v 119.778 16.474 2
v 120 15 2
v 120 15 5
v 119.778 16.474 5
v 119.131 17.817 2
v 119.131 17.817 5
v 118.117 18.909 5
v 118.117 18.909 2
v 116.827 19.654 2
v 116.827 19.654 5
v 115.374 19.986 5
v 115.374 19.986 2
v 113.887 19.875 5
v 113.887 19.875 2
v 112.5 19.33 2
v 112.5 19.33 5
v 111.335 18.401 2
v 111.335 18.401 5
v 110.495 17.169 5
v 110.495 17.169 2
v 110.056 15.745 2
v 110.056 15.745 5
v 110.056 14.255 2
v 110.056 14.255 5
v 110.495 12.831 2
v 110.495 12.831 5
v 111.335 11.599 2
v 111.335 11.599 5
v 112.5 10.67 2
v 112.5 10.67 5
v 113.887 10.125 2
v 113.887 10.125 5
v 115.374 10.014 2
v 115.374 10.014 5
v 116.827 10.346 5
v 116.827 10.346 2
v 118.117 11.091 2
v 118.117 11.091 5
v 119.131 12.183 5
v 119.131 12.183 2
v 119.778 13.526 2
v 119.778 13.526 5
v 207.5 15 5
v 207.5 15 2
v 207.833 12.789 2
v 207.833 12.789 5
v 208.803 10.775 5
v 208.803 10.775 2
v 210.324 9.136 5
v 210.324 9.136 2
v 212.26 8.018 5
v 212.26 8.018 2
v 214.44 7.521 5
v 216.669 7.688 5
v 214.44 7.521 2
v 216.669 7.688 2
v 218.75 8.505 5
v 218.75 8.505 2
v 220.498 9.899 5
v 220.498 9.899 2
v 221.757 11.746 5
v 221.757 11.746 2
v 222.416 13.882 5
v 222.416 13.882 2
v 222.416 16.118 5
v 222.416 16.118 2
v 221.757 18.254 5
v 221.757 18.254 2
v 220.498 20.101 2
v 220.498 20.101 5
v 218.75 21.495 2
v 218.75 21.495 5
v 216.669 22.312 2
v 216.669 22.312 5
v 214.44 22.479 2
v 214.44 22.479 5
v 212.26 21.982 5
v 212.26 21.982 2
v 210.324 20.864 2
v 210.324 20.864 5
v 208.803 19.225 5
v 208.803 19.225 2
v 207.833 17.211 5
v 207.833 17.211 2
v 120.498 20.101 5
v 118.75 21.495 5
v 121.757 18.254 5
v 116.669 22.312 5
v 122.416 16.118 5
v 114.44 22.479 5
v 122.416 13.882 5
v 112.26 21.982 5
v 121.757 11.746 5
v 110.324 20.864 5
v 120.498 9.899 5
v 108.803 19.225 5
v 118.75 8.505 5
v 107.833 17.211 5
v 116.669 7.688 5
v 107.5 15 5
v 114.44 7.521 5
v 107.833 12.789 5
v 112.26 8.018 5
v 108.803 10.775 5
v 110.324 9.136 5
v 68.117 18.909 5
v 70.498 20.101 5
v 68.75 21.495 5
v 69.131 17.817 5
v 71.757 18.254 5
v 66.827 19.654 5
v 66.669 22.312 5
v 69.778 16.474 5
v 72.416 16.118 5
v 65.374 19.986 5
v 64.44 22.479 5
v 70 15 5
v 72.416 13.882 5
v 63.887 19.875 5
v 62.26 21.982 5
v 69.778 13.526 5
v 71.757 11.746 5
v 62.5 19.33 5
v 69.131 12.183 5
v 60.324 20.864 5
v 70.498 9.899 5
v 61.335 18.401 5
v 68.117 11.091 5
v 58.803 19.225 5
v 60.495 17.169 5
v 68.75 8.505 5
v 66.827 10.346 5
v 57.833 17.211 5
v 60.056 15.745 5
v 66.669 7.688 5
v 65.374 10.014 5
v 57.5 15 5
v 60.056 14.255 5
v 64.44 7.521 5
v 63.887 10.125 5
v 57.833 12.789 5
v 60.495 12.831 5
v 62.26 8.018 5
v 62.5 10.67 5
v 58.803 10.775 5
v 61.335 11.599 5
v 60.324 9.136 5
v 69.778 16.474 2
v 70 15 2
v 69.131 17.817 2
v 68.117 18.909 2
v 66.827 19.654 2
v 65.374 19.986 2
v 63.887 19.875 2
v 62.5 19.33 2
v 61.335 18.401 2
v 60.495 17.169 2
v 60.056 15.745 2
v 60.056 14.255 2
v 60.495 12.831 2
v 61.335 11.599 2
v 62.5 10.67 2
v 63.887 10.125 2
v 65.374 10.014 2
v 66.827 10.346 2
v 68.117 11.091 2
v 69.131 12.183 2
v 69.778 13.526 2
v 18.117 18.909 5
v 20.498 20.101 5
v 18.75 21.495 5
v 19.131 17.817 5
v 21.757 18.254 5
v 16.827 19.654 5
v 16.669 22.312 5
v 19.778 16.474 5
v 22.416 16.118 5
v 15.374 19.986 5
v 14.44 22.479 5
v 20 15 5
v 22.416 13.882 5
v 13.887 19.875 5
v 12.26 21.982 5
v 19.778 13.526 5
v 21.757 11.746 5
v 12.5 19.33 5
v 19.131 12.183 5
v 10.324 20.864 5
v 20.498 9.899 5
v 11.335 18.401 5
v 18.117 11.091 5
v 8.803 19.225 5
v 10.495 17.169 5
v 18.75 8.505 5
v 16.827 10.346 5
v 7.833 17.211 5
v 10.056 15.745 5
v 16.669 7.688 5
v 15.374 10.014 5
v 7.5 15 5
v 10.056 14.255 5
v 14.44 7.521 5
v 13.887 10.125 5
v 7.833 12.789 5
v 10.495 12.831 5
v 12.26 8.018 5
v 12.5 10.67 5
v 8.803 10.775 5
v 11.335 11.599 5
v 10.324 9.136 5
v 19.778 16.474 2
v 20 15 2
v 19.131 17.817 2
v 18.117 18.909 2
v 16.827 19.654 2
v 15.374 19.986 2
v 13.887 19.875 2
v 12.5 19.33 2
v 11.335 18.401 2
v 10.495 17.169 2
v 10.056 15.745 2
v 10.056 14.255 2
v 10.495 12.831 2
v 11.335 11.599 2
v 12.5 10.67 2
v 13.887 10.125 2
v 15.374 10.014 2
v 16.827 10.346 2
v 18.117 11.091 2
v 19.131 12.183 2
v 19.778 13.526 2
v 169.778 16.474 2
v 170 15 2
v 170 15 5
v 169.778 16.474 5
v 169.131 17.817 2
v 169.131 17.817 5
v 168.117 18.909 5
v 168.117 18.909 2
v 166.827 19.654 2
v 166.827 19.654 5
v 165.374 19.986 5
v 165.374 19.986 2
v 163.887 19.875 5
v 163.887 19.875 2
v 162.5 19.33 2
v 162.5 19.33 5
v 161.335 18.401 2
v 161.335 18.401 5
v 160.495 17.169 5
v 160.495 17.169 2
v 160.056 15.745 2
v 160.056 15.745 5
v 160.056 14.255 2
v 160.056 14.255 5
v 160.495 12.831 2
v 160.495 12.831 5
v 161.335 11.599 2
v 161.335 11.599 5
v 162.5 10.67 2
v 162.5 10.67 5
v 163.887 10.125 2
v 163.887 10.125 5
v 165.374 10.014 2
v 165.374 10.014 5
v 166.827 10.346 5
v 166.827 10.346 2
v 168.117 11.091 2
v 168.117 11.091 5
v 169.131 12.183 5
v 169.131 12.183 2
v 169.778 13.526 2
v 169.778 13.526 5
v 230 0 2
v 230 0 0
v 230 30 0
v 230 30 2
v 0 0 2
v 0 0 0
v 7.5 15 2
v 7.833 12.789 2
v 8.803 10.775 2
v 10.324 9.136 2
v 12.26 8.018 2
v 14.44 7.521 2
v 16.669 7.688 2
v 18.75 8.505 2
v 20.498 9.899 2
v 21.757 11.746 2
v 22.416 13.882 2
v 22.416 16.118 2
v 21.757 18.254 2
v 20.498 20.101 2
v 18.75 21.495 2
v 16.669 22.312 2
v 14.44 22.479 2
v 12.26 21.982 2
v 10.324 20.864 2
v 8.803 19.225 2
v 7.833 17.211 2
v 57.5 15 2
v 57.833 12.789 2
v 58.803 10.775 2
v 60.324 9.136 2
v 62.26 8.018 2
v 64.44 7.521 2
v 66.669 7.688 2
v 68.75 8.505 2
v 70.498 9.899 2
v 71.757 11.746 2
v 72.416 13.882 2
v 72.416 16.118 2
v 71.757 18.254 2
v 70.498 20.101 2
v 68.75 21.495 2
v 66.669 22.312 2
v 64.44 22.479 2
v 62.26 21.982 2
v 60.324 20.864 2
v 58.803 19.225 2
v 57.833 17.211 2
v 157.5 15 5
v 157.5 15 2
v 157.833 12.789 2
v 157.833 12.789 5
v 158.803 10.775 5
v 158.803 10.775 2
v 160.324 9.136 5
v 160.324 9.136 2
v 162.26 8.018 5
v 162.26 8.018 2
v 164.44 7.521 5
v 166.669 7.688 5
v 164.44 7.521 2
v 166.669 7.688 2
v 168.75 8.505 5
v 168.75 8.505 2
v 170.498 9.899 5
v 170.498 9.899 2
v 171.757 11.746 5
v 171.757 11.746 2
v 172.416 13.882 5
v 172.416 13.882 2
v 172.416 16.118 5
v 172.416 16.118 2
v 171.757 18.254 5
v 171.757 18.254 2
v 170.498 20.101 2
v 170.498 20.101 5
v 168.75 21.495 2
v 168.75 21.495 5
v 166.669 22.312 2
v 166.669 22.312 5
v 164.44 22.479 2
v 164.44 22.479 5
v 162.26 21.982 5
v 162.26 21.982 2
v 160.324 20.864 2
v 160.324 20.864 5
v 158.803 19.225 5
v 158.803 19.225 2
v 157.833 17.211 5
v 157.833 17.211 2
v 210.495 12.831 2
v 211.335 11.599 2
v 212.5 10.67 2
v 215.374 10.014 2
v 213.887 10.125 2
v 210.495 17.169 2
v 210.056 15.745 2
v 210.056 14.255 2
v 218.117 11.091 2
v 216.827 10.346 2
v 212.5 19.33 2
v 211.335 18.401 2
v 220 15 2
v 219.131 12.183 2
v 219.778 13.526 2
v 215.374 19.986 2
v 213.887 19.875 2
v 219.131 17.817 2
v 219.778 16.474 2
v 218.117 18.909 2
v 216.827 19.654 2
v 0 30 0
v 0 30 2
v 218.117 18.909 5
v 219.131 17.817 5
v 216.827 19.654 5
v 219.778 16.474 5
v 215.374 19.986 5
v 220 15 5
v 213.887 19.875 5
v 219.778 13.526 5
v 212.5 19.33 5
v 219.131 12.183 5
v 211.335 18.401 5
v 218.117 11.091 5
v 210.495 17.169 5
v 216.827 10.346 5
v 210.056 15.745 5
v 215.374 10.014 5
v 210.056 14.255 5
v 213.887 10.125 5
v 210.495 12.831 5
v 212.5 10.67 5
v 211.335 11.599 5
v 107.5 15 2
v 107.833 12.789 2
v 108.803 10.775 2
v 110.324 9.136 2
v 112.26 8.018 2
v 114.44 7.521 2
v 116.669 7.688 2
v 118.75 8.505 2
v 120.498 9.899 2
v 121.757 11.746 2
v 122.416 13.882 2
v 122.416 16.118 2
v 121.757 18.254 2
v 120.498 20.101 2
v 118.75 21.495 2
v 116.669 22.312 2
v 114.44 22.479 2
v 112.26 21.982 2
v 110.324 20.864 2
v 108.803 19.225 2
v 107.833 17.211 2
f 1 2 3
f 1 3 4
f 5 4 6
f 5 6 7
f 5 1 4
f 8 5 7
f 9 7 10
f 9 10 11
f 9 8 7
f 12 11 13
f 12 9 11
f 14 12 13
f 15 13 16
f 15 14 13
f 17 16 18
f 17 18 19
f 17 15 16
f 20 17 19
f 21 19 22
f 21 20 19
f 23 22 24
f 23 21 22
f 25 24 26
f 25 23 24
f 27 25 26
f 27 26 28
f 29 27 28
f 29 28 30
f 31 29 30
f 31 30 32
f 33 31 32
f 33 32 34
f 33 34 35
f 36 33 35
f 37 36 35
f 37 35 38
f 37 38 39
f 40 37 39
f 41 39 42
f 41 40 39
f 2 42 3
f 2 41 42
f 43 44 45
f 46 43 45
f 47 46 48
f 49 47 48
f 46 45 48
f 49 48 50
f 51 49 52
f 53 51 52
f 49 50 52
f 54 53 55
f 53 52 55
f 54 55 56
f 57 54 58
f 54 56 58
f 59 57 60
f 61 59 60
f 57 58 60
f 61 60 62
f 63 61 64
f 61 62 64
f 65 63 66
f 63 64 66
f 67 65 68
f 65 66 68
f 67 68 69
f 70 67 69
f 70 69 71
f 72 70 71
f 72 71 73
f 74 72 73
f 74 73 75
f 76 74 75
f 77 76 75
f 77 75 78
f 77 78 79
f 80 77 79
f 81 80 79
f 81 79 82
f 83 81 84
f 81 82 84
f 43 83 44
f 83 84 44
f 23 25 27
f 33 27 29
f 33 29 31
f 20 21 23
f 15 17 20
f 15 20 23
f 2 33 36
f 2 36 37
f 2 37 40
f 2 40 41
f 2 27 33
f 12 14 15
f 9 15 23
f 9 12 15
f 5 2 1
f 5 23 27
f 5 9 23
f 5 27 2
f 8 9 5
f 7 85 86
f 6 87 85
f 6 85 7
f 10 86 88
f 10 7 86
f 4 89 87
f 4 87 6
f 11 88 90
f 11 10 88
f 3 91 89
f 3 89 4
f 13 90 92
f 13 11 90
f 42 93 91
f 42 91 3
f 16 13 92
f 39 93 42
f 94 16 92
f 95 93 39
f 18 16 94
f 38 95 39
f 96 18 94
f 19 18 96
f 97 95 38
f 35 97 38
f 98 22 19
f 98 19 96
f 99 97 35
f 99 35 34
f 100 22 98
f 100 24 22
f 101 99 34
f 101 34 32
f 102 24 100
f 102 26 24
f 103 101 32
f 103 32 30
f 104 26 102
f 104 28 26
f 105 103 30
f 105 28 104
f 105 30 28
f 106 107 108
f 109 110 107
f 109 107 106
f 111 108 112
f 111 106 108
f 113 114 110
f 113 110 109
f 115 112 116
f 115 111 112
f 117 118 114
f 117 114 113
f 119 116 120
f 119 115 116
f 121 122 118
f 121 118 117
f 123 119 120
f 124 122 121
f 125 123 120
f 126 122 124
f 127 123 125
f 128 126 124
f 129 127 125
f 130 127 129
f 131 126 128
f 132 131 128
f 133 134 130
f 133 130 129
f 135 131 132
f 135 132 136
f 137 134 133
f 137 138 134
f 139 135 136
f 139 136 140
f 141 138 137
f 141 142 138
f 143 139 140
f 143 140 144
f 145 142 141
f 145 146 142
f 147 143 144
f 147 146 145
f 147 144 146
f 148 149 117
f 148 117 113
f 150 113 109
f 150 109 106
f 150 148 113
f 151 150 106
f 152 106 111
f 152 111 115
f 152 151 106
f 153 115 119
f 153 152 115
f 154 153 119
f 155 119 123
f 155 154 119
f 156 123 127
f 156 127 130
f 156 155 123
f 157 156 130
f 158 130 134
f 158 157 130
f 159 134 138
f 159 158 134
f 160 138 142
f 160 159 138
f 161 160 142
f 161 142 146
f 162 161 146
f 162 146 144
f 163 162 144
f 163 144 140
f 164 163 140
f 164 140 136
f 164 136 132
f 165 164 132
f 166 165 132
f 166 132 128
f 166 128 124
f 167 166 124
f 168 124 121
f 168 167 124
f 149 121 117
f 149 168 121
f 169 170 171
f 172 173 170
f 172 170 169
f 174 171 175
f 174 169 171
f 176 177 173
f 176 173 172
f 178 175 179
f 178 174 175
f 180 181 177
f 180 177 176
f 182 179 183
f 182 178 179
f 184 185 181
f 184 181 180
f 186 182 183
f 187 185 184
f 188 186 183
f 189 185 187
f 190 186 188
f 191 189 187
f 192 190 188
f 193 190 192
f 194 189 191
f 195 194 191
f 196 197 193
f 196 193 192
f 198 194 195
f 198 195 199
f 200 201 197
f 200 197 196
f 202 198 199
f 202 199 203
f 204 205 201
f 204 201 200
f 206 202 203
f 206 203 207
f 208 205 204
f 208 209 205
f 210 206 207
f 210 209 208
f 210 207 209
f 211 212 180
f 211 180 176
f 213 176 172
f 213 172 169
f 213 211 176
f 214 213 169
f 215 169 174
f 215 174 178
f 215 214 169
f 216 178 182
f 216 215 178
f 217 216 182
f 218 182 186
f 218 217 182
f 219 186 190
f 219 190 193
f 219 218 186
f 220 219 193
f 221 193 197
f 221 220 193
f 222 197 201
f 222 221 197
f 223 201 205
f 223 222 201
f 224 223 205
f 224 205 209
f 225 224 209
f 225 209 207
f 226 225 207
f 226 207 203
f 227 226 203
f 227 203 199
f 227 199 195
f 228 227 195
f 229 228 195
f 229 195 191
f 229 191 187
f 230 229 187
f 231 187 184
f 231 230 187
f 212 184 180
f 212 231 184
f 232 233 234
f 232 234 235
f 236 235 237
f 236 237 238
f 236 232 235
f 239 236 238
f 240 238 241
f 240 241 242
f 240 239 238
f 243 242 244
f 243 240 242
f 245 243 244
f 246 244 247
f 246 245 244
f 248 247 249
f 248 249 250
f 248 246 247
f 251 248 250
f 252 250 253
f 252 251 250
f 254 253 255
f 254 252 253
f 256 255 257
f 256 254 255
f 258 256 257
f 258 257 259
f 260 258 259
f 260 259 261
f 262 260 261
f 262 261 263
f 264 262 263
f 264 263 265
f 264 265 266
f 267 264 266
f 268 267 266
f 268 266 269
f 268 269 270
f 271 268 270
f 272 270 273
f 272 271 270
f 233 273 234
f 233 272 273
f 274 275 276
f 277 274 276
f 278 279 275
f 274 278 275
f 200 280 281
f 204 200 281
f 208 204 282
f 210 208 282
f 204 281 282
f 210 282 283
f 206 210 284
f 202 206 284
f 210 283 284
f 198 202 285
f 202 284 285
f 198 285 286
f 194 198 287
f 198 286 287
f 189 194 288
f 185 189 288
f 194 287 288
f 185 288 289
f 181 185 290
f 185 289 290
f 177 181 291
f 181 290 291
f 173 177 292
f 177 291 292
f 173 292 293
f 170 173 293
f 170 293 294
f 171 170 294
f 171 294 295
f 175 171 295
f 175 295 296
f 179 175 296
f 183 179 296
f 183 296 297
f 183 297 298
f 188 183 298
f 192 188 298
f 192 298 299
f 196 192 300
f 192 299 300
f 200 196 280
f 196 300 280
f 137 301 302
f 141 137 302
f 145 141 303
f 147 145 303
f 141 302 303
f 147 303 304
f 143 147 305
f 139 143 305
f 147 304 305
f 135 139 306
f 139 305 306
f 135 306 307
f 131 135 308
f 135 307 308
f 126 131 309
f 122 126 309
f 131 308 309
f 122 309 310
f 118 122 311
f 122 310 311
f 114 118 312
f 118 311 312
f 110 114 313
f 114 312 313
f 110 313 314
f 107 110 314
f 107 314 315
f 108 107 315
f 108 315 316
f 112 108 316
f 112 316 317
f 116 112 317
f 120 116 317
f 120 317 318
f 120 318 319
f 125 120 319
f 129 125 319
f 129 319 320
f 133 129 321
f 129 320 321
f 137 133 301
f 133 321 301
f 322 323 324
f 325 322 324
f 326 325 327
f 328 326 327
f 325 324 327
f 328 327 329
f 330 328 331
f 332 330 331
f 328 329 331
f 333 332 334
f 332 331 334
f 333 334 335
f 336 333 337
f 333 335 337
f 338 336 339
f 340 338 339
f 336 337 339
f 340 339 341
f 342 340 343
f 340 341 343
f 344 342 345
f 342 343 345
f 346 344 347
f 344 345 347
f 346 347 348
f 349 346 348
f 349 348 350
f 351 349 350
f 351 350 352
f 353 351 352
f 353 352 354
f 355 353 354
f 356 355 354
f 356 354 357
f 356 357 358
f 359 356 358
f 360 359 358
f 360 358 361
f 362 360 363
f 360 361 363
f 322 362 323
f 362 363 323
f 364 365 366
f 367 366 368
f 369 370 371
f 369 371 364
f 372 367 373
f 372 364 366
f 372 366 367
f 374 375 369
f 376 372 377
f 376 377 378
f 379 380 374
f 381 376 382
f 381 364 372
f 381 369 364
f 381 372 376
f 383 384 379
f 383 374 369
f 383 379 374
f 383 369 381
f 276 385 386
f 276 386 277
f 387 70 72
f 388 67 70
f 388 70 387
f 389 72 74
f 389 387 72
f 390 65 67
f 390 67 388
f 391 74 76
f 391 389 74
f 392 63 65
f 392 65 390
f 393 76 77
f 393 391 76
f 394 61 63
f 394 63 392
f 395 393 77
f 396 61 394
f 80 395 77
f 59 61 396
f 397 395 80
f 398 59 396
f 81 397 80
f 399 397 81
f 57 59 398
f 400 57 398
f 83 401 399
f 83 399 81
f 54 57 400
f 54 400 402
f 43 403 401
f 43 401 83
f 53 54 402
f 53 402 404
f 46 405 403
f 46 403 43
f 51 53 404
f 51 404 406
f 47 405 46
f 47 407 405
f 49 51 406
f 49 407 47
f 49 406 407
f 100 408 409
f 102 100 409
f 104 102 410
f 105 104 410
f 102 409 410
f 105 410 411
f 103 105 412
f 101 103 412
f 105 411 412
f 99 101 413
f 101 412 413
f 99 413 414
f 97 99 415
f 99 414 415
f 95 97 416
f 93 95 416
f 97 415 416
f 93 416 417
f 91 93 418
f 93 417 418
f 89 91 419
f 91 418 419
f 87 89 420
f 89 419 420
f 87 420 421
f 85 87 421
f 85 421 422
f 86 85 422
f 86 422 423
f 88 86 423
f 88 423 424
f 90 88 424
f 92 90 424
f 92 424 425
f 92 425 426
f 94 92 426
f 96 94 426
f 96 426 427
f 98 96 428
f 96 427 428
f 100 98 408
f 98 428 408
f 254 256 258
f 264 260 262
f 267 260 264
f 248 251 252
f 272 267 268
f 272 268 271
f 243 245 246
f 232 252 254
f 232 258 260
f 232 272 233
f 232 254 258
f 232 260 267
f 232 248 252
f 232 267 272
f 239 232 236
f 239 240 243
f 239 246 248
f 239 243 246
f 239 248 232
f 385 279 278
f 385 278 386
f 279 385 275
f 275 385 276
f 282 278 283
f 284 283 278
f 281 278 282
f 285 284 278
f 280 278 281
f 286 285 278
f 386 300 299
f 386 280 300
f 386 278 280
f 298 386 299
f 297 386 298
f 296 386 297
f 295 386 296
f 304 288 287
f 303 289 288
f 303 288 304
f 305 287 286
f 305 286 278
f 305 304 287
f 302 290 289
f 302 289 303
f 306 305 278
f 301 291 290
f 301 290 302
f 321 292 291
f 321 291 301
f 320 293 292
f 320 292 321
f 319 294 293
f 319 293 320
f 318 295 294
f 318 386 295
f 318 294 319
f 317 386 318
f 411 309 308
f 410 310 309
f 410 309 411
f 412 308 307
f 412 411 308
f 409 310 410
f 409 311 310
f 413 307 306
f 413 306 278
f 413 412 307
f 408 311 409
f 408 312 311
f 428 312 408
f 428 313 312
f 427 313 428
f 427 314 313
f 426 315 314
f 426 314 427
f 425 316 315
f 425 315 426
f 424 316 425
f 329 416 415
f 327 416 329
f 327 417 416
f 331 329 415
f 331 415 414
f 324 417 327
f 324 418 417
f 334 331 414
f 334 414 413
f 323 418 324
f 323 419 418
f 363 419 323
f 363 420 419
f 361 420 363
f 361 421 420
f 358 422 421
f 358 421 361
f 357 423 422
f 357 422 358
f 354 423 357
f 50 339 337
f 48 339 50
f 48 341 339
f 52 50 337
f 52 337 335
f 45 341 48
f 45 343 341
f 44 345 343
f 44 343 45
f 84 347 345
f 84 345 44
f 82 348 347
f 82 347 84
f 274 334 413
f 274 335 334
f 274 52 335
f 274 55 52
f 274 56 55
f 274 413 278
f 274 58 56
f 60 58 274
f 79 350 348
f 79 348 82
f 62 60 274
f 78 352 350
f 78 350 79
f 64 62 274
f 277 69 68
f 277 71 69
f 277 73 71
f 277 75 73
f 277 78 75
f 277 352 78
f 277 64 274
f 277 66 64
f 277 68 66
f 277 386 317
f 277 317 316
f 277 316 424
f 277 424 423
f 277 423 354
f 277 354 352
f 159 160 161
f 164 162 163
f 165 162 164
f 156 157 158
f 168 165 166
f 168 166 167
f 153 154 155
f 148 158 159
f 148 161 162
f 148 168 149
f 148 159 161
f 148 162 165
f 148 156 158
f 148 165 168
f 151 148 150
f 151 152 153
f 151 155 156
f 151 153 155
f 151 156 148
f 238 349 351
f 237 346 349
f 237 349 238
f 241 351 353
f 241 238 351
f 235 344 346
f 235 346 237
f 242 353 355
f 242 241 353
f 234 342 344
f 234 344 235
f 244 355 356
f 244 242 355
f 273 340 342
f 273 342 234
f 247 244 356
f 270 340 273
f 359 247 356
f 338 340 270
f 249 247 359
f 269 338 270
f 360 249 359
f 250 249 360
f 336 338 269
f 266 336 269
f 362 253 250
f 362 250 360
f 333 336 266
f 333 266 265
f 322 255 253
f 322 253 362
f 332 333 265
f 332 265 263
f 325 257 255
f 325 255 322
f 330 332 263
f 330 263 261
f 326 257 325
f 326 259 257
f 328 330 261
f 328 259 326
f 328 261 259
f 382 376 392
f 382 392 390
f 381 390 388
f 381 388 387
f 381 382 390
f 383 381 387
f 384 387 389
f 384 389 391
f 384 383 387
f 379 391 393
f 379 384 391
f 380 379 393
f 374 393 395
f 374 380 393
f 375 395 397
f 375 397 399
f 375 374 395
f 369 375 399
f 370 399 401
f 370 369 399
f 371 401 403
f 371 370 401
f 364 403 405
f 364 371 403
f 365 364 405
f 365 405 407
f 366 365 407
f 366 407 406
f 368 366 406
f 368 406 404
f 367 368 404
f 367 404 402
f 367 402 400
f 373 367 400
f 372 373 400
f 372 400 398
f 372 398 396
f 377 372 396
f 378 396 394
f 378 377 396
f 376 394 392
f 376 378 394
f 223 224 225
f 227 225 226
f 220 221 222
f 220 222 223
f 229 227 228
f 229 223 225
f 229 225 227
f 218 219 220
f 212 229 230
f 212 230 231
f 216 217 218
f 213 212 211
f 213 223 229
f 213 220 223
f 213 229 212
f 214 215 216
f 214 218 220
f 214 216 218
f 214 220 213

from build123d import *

# Parameters (mm, degrees)
ESQUISSE1_W        = 230
ESQUISSE1_H        = 30
BOSS_EXTRU_1_DEPTH = 2
ESQUISSE2_R        = 7.5
ESQUISSE2_R_2      = 5
BOSS_EXTRU_2_DEPTH = 3


with BuildPart() as part:
    # Esquisse1 → Boss.-Extru.1 (new body)
    with BuildSketch(Plane.XY):
        with Locations((115, 15)):
            Rectangle(ESQUISSE1_W, ESQUISSE1_H)
    extrude(amount=BOSS_EXTRU_1_DEPTH)

    # Esquisse2 → Boss.-Extru.2 (add)
    # profile 1 of 5: a face of its own
    with BuildSketch(Plane.XY.offset(2)):
        with Locations(Location((15, 15, 0), (0, 0, 180))):
            Circle(ESQUISSE2_R)
        with Locations((15, 15)):
            Circle(ESQUISSE2_R_2, mode=Mode.SUBTRACT)
    # profile 2 of 5: a face of its own
    with BuildSketch(Plane.XY.offset(2)):
        with Locations(Location((65, 15, 0), (0, 0, 180))):
            Circle(ESQUISSE2_R)
        with Locations((65, 15)):
            Circle(ESQUISSE2_R_2, mode=Mode.SUBTRACT)
    # profile 3 of 5: a face of its own
    with BuildSketch(Plane.XY.offset(2)):
        with Locations(Location((115, 15, 0), (0, 0, 180))):
            Circle(ESQUISSE2_R)
        with Locations((115, 15)):
            Circle(ESQUISSE2_R_2, mode=Mode.SUBTRACT)
    # profile 4 of 5: a face of its own
    with BuildSketch(Plane.XY.offset(2)):
        with Locations(Location((165, 15, 0), (0, 0, 180))):
            Circle(ESQUISSE2_R)
        with Locations((165, 15)):
            Circle(ESQUISSE2_R_2, mode=Mode.SUBTRACT)
    # profile 5 of 5: a face of its own
    with BuildSketch(Plane.XY.offset(2)):
        with Locations(Location((215, 15, 0), (0, 0, 180))):
            Circle(ESQUISSE2_R)
        with Locations((215, 15)):
            Circle(ESQUISSE2_R_2, mode=Mode.SUBTRACT)
    extrude(amount=BOSS_EXTRU_2_DEPTH)


solid = part.part
